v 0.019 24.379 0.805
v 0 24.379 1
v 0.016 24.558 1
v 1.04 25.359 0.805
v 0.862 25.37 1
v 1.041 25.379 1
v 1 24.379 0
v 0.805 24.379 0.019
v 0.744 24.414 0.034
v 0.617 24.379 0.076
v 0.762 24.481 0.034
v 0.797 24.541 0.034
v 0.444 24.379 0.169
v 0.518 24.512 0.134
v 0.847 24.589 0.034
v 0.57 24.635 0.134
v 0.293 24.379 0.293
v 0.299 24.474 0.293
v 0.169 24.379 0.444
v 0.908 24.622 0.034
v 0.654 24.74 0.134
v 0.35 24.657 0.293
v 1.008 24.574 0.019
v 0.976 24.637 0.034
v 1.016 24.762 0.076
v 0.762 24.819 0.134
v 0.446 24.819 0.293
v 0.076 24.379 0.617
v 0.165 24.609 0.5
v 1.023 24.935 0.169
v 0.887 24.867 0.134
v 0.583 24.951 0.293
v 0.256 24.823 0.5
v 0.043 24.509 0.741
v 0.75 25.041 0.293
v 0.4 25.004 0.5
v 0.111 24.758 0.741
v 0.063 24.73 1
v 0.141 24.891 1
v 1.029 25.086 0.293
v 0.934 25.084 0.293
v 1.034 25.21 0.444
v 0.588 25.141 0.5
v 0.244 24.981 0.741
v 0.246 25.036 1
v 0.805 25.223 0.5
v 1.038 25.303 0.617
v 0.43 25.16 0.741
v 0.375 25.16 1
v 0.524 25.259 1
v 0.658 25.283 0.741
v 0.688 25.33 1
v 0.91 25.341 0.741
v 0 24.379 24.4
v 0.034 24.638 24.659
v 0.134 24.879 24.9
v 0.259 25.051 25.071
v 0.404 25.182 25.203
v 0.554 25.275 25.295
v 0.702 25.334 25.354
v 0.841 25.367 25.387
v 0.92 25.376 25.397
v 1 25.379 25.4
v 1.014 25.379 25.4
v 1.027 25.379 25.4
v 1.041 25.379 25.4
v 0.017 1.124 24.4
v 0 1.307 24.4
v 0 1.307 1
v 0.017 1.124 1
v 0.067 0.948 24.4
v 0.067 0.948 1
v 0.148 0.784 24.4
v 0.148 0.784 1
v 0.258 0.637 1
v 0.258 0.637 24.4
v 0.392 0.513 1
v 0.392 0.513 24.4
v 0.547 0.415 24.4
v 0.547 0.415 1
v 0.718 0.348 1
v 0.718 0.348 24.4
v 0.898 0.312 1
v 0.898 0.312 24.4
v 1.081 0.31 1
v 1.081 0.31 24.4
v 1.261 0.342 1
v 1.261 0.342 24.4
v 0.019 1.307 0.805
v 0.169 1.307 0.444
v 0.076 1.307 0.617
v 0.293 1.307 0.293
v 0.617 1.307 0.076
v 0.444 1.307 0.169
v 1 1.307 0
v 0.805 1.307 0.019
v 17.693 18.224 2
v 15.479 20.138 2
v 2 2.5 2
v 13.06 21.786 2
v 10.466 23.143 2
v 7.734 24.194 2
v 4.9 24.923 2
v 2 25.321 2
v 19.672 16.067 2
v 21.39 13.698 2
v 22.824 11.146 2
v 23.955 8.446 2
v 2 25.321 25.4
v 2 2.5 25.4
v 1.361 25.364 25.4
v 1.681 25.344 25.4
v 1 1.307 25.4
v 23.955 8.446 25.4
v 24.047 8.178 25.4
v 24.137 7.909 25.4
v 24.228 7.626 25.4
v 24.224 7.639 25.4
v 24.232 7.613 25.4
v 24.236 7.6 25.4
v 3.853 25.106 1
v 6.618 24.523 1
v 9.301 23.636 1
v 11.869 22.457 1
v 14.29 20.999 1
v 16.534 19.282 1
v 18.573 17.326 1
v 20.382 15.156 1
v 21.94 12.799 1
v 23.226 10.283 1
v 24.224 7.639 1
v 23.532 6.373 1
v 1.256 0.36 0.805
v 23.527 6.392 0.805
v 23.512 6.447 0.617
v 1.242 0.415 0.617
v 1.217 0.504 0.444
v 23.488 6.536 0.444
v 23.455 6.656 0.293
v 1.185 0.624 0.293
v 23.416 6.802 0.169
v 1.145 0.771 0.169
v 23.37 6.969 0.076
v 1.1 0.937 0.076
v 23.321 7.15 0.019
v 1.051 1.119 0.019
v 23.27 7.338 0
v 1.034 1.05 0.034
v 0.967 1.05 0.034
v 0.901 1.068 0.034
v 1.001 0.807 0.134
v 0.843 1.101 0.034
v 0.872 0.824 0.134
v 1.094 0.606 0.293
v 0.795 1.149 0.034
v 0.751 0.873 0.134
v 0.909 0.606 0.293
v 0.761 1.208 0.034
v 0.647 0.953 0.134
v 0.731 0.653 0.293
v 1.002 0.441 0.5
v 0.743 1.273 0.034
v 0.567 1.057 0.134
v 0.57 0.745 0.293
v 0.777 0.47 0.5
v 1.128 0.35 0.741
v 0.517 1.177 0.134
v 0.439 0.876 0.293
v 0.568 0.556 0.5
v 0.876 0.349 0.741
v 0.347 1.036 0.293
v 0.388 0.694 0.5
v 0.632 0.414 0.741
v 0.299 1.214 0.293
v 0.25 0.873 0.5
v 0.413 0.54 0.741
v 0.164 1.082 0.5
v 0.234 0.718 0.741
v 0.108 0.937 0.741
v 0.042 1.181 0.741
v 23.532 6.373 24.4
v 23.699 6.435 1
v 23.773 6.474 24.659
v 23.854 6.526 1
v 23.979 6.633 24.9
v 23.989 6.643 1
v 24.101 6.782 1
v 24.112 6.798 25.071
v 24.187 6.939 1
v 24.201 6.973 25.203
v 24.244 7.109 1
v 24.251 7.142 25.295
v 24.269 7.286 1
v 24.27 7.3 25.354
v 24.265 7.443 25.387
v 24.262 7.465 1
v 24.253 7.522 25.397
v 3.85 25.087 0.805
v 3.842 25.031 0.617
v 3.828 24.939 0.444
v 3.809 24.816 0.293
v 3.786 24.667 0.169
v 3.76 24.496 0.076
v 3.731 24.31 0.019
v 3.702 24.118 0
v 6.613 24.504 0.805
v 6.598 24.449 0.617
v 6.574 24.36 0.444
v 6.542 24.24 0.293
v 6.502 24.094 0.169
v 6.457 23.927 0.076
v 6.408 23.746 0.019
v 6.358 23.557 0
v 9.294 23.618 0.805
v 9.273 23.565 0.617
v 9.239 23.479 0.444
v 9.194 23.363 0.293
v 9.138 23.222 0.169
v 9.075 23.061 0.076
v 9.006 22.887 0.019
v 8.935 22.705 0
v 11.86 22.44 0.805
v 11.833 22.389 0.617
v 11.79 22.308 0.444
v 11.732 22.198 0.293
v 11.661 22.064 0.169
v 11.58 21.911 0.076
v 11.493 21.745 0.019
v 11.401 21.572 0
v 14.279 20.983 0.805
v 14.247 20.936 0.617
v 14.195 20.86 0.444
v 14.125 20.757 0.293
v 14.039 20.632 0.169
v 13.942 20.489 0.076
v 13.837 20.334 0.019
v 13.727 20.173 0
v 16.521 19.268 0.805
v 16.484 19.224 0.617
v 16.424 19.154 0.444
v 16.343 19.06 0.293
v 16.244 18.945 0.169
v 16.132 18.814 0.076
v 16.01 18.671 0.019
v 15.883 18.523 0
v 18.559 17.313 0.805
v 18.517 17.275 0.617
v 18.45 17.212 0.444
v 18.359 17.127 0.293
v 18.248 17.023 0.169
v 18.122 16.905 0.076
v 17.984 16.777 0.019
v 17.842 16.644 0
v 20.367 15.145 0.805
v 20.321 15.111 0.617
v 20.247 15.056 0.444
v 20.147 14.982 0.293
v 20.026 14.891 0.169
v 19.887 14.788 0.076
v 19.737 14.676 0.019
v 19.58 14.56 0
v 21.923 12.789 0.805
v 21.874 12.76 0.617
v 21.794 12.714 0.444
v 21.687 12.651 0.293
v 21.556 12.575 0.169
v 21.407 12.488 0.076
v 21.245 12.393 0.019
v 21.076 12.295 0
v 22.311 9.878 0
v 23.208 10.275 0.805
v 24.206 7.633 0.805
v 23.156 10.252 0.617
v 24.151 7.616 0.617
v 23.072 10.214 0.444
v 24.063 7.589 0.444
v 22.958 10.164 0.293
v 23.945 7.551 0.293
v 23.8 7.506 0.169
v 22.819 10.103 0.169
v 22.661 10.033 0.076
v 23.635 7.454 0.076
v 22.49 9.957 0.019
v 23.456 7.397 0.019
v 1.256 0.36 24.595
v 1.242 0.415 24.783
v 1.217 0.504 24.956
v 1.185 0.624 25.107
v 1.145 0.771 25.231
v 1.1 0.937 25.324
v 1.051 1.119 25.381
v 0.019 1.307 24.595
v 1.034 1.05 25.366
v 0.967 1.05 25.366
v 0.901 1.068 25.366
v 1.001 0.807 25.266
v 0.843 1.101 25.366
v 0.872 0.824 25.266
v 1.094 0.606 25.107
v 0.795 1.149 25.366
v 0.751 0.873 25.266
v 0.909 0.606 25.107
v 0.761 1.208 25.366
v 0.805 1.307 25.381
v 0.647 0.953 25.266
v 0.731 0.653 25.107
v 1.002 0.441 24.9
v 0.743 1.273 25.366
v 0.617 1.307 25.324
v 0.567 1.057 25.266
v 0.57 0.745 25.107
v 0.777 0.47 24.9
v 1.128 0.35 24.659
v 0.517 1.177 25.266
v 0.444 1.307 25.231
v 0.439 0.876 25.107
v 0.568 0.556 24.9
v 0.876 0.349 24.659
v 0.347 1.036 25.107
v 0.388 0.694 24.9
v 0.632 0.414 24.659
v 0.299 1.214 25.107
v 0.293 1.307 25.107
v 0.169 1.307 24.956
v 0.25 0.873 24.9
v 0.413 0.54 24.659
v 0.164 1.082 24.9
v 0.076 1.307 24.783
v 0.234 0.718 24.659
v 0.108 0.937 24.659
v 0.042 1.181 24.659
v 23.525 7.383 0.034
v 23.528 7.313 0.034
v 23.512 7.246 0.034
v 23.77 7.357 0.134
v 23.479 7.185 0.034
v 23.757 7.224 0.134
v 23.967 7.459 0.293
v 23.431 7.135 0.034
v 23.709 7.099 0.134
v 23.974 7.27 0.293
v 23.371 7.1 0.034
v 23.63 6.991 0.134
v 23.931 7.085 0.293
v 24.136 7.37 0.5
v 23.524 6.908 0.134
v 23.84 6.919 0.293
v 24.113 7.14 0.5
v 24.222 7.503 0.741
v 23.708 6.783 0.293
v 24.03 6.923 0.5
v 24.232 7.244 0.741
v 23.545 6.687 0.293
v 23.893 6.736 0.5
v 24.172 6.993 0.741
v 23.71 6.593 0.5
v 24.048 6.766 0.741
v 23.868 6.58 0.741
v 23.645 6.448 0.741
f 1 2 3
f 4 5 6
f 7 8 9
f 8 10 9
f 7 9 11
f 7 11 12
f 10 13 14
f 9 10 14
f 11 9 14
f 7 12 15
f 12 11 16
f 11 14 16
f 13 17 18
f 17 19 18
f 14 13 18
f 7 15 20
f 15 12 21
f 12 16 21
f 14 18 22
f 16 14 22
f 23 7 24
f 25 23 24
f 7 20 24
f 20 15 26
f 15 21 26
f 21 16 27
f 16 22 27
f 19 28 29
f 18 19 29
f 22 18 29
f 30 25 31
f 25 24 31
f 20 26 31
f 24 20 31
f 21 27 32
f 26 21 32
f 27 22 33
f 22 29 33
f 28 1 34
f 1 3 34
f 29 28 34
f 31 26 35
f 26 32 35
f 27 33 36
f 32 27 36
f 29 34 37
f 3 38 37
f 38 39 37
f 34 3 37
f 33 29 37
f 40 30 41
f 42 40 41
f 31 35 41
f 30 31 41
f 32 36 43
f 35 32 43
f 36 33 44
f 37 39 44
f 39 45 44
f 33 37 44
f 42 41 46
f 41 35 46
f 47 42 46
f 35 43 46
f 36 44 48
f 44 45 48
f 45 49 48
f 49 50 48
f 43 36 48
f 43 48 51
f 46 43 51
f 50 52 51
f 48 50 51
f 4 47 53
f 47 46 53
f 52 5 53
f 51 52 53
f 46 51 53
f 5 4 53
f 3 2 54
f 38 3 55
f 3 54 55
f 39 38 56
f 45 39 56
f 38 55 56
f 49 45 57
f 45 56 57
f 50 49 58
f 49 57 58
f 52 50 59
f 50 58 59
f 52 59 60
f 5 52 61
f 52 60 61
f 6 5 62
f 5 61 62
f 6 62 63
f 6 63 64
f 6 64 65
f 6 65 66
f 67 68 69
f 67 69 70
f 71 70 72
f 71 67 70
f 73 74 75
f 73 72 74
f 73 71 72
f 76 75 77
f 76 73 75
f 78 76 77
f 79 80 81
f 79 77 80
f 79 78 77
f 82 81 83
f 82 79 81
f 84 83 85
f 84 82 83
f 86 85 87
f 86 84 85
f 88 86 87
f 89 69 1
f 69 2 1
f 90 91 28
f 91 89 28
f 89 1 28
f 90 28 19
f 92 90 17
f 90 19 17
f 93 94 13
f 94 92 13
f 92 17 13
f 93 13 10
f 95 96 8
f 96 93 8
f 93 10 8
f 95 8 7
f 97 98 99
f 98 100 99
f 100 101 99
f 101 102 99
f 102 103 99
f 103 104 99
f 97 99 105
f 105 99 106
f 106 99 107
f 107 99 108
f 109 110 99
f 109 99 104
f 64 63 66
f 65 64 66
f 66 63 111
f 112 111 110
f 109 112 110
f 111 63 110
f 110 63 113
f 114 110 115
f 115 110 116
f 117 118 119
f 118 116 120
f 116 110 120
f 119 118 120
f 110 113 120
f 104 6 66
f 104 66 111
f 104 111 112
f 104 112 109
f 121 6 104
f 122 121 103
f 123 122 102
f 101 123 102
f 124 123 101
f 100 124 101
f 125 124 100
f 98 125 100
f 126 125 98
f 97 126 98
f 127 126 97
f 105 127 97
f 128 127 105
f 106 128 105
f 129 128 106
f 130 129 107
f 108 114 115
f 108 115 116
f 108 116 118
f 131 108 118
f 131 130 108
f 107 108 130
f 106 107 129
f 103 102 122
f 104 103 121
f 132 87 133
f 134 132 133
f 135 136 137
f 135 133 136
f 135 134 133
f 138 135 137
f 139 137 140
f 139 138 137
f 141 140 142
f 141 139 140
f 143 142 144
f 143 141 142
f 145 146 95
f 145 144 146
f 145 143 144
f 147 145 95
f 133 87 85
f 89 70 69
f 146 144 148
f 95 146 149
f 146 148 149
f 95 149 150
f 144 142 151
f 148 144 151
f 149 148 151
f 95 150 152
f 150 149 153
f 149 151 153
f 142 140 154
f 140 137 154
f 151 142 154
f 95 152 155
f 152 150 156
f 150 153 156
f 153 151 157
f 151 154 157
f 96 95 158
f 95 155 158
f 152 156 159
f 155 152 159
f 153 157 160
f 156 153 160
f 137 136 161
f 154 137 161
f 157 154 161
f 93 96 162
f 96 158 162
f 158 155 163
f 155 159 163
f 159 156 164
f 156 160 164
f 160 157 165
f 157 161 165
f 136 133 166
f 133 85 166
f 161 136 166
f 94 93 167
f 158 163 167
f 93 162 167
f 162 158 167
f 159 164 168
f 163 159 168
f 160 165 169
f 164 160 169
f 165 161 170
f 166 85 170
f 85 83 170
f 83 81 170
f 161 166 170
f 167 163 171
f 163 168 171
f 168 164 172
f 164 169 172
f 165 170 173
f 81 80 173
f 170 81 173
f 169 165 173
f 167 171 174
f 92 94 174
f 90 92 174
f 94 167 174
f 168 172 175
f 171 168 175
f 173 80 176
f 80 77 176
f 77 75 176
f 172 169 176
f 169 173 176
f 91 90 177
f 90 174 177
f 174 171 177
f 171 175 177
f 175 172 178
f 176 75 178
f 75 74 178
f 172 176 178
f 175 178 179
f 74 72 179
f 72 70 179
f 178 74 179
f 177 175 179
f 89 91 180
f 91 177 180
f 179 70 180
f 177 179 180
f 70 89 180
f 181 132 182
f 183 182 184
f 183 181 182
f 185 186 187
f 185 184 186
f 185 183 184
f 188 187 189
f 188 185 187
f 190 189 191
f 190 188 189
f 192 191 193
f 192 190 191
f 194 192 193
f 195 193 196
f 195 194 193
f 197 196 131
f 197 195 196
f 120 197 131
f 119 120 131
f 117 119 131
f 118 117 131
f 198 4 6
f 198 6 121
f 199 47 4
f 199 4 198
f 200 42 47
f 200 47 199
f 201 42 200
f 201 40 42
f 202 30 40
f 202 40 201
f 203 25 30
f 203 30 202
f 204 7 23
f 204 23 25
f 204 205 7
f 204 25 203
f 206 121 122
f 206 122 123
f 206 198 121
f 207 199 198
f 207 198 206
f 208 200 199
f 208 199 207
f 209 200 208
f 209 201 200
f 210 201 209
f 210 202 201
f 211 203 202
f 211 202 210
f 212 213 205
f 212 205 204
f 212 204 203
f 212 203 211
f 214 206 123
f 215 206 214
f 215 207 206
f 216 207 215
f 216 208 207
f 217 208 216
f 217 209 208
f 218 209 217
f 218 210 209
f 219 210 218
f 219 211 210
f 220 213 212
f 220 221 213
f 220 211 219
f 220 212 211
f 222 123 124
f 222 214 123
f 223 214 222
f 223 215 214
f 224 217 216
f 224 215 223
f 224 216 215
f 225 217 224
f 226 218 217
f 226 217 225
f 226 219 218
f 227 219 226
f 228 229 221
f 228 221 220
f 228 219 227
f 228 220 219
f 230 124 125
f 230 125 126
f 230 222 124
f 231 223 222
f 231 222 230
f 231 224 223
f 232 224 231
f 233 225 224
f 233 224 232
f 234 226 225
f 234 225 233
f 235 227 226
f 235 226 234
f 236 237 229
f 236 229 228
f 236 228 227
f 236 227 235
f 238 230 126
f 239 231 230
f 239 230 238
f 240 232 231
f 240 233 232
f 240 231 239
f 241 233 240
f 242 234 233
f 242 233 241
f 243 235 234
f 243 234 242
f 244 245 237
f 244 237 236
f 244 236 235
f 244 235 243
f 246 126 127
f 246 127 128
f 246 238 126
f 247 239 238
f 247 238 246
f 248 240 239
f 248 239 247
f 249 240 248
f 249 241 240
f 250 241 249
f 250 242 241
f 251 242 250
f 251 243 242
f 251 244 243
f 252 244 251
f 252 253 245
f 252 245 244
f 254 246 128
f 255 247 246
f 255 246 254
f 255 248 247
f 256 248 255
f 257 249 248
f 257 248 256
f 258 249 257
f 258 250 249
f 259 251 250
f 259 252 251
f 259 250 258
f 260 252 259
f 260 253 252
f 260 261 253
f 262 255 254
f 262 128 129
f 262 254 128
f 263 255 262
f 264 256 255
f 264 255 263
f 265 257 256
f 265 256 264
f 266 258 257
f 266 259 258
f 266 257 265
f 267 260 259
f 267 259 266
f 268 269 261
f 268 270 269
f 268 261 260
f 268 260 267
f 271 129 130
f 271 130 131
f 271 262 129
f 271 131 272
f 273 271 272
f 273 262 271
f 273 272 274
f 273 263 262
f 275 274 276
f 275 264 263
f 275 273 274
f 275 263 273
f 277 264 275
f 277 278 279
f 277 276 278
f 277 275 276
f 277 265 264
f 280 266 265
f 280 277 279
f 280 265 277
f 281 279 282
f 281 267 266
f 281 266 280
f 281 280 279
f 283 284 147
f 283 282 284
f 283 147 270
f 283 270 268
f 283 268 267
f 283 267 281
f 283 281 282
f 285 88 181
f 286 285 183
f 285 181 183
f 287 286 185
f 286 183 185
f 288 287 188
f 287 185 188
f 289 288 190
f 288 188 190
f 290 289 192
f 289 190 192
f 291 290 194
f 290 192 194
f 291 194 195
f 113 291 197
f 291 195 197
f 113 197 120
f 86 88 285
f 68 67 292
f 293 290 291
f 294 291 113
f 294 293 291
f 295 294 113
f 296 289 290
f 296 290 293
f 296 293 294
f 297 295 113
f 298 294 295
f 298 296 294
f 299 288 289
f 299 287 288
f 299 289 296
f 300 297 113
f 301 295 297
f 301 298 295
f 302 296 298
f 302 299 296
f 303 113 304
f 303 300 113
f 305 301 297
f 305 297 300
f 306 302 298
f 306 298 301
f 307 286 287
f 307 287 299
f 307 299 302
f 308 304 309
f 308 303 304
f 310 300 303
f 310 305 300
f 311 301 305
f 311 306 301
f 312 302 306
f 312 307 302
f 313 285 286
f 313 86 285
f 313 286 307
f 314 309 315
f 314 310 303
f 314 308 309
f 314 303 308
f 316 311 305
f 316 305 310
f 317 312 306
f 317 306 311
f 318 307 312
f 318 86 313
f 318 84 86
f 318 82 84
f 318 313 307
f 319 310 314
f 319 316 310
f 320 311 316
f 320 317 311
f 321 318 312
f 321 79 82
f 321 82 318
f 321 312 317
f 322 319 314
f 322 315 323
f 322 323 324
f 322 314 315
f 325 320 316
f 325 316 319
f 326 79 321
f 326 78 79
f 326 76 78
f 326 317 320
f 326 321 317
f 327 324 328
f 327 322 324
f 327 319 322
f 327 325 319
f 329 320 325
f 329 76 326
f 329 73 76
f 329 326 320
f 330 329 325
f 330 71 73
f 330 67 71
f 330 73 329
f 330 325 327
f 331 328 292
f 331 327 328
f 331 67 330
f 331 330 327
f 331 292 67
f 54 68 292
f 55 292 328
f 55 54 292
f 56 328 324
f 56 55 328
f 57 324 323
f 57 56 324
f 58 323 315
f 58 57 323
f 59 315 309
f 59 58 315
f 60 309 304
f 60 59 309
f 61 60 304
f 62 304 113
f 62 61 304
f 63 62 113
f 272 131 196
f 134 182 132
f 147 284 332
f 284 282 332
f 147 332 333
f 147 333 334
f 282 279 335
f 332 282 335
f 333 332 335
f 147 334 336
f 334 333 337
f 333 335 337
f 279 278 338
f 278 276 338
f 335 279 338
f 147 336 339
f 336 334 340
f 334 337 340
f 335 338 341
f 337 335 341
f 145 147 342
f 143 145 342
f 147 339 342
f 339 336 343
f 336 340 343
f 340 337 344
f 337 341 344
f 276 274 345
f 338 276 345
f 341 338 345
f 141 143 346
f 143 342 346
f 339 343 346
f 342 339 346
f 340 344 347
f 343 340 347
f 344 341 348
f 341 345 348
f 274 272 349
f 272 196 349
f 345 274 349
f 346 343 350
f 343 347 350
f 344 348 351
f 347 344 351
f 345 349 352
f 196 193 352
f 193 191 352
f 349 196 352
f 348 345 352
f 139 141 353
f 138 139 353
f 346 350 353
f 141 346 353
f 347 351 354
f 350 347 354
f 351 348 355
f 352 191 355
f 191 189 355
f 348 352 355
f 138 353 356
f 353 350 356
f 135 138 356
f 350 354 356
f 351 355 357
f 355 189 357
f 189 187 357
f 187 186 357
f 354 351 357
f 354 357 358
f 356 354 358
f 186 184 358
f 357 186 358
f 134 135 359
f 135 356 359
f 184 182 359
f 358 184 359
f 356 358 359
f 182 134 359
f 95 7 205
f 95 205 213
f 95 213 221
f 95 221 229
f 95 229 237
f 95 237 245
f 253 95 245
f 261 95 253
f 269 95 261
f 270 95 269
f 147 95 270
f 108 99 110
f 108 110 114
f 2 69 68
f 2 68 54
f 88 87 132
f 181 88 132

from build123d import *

# Parameters (mm, degrees)
PAD_DEPTH    = 25.4
POCKET_DEPTH = 23.4
FILLET_R     = 1


with BuildPart() as corner:
    # Sketch → Pad (new body)
    with BuildSketch(Plane.XY):
        with BuildLine():
            Line((0, 0), (0, -25.4))
            ThreePointArc((0, -25.4), (15.435414, -20.171961), (24.516737, -6.64))
            Line((0, 0), (24.516737, -6.64))
        make_face()
    extrude(amount=PAD_DEPTH)

    # Sketch001 (on Face5 of Pad) → Pocket (cut)
    with BuildSketch(Plane.XY.offset(25.4)):
        with BuildLine():
            Line((2, -2.5), (2, -27.9))
            ThreePointArc((2, -27.9), (17.435414, -22.671961), (26.516737, -9.14))
            Line((2, -2.5), (26.516737, -9.14))
        make_face()
    extrude(amount=-POCKET_DEPTH, mode=Mode.SUBTRACT)

    # Fillet
    fillet_edges = [corner.edges().sort_by_distance(p)[0] for p in [
        (0, -25.4, 12.7),
        (0, -12.7, 25.4),
        (0, -12.7, 0),
        (0, 0, 12.7),
        (15.435414, -20.171961, 0),
        (12.258369, -3.32, 0),
        (12.258369, -3.32, 25.4),
        (24.516737, -6.64, 12.7),
    ]]
    fillet(fillet_edges, radius=FILLET_R)


with BuildPart() as part_mirroring:
    # Part__Mirroring: instance of Corner
    add(corner.part.mirror(Plane(origin=(0, 0, 0), x_dir=(1, 0, 0), z_dir=(0, 1, 0))))


solid = part_mirroring.part
